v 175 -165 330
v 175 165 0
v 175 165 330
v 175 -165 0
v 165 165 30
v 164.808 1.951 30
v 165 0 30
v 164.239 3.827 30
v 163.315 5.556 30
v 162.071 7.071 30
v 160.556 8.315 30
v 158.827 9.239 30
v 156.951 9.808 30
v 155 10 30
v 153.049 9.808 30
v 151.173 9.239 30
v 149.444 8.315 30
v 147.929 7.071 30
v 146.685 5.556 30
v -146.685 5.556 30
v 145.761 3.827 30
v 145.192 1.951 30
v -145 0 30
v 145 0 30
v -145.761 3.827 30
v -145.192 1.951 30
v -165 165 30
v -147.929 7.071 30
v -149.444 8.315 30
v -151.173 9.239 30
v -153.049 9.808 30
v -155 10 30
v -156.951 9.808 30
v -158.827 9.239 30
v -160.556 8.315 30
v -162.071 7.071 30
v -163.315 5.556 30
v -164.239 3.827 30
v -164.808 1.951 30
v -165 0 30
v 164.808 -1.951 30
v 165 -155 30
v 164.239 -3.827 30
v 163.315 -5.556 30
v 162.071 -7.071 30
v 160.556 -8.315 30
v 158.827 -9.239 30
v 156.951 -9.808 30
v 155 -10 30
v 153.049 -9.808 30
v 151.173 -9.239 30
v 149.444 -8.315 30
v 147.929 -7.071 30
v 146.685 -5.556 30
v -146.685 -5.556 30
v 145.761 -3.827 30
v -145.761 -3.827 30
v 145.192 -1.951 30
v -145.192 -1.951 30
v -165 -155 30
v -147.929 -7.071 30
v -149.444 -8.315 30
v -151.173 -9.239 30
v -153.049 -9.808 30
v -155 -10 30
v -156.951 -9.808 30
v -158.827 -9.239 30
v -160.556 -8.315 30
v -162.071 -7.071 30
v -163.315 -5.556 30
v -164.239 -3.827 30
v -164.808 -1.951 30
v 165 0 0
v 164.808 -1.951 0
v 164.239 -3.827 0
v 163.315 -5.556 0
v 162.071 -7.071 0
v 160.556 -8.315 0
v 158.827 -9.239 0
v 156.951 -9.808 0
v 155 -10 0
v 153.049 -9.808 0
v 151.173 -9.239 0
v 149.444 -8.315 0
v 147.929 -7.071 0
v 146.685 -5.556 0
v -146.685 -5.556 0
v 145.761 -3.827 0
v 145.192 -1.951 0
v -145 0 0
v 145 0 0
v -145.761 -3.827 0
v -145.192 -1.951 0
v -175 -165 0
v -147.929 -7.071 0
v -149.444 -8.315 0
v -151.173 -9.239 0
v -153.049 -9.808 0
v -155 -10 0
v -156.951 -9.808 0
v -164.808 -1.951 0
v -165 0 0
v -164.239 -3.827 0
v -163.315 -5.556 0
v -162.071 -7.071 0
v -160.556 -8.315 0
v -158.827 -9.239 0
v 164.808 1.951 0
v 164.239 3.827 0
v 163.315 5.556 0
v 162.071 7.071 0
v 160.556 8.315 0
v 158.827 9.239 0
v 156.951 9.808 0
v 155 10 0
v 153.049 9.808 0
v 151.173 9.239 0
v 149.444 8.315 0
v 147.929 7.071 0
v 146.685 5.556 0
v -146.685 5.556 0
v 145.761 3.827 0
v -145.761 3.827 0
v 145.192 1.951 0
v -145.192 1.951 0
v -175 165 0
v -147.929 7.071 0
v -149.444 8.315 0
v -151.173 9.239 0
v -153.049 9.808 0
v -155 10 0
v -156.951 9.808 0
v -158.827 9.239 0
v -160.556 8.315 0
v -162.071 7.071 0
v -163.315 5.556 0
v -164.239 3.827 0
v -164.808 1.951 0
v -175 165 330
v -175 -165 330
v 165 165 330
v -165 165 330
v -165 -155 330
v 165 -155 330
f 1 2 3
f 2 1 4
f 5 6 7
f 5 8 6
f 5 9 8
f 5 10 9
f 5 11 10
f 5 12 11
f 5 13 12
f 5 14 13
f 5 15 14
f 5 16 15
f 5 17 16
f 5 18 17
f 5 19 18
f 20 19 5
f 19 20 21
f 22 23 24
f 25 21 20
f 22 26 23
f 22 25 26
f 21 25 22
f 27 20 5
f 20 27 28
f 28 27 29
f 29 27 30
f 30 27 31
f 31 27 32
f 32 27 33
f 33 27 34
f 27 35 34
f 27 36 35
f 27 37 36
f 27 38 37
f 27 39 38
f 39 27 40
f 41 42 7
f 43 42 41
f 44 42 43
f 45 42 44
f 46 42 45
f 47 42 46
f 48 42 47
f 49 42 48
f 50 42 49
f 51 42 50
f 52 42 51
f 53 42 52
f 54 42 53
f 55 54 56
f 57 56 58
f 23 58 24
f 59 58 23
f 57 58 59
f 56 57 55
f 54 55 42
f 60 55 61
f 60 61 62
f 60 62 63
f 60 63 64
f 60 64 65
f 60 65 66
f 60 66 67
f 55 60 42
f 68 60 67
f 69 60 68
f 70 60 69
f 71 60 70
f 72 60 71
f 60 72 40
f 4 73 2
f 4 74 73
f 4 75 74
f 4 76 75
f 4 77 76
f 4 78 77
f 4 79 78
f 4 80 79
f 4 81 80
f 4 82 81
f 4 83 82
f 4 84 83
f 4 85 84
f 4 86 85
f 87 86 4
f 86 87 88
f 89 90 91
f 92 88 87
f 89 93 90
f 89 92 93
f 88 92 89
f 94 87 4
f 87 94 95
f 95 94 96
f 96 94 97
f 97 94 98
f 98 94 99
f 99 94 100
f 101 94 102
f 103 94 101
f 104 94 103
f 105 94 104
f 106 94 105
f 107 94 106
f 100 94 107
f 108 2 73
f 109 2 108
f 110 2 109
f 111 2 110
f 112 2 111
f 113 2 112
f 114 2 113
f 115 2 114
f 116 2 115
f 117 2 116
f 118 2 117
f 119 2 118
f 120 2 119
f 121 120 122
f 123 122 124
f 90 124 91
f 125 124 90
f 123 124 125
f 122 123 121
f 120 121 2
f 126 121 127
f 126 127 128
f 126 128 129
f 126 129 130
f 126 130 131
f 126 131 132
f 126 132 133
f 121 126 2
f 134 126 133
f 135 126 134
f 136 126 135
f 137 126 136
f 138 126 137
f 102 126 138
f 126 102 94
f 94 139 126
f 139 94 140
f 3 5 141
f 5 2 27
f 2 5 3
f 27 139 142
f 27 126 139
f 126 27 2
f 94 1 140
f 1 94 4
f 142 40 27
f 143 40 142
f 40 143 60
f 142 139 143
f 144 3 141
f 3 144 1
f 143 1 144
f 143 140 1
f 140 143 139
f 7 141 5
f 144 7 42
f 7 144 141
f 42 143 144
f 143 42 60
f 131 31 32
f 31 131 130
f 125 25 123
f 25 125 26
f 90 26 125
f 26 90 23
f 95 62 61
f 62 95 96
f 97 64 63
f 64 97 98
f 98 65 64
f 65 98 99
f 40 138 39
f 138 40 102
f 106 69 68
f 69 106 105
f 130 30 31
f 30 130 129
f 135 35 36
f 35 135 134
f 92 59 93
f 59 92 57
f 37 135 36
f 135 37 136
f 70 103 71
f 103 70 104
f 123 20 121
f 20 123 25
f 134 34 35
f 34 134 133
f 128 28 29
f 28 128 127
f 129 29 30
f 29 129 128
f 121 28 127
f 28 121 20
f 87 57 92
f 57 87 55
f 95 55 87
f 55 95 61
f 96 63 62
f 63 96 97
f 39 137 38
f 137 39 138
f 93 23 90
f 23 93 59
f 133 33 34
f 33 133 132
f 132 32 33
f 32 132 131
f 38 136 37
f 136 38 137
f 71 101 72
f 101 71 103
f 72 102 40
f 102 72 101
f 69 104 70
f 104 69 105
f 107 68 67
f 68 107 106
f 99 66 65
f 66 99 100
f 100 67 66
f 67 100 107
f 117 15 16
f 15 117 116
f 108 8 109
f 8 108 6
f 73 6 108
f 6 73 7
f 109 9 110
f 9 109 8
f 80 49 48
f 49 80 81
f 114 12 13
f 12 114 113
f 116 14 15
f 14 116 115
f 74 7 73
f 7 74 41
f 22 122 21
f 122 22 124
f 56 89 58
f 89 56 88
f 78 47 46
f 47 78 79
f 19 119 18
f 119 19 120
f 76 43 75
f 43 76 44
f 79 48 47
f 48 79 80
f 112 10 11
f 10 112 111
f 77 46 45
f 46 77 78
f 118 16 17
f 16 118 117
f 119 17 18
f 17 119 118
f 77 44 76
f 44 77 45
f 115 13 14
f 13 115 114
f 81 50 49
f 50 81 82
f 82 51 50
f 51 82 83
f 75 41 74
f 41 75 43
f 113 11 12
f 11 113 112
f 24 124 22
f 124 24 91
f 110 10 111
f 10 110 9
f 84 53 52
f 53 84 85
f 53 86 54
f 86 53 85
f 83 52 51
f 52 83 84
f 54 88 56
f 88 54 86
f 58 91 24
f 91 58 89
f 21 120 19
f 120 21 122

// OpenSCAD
// Bookcube for Bookrobot System
// Size: 0.35m(W) x 0.33m(D) x 0.30m(H)
// Top and Front: OPEN
// Bottom: 2 circular holes at side edges (10mm diameter)

// Dimensions (in mm for OpenSCAD)
width = 350;
depth = 330;
height = 300;
bottom_thickness = 30;
wall_thickness = 10;

// Hole parameters
hole_diameter = 20;  // 20mm (2cm) diameter holes
hole_x_offset = 155; // holes at ±155mm from center (total distance 310mm = 31cm)

module bookcube() {
    difference() {
        union() {
            // Bottom plate (thick)
            translate([0, 0, bottom_thickness/2])
                cube([width, depth, bottom_thickness], center=true);

            // Left side wall
            translate([-width/2 + wall_thickness/2, 0, bottom_thickness + height/2])
                cube([wall_thickness, depth, height], center=true);

            // Right side wall
            translate([width/2 - wall_thickness/2, 0, bottom_thickness + height/2])
                cube([wall_thickness, depth, height], center=true);

            // Back wall
            translate([0, -depth/2 + wall_thickness/2, bottom_thickness + height/2])
                cube([width - 2*wall_thickness, wall_thickness, height], center=true);
        }

        // Left hole (circular, through bottom plate)
        translate([-hole_x_offset, 0, -1])
            cylinder(h=bottom_thickness + 2, d=hole_diameter, center=false, $fn=32);

        // Right hole (circular, through bottom plate)
        translate([hole_x_offset, 0, -1])
            cylinder(h=bottom_thickness + 2, d=hole_diameter, center=false, $fn=32);
    }
}

// Create the model
bookcube();
